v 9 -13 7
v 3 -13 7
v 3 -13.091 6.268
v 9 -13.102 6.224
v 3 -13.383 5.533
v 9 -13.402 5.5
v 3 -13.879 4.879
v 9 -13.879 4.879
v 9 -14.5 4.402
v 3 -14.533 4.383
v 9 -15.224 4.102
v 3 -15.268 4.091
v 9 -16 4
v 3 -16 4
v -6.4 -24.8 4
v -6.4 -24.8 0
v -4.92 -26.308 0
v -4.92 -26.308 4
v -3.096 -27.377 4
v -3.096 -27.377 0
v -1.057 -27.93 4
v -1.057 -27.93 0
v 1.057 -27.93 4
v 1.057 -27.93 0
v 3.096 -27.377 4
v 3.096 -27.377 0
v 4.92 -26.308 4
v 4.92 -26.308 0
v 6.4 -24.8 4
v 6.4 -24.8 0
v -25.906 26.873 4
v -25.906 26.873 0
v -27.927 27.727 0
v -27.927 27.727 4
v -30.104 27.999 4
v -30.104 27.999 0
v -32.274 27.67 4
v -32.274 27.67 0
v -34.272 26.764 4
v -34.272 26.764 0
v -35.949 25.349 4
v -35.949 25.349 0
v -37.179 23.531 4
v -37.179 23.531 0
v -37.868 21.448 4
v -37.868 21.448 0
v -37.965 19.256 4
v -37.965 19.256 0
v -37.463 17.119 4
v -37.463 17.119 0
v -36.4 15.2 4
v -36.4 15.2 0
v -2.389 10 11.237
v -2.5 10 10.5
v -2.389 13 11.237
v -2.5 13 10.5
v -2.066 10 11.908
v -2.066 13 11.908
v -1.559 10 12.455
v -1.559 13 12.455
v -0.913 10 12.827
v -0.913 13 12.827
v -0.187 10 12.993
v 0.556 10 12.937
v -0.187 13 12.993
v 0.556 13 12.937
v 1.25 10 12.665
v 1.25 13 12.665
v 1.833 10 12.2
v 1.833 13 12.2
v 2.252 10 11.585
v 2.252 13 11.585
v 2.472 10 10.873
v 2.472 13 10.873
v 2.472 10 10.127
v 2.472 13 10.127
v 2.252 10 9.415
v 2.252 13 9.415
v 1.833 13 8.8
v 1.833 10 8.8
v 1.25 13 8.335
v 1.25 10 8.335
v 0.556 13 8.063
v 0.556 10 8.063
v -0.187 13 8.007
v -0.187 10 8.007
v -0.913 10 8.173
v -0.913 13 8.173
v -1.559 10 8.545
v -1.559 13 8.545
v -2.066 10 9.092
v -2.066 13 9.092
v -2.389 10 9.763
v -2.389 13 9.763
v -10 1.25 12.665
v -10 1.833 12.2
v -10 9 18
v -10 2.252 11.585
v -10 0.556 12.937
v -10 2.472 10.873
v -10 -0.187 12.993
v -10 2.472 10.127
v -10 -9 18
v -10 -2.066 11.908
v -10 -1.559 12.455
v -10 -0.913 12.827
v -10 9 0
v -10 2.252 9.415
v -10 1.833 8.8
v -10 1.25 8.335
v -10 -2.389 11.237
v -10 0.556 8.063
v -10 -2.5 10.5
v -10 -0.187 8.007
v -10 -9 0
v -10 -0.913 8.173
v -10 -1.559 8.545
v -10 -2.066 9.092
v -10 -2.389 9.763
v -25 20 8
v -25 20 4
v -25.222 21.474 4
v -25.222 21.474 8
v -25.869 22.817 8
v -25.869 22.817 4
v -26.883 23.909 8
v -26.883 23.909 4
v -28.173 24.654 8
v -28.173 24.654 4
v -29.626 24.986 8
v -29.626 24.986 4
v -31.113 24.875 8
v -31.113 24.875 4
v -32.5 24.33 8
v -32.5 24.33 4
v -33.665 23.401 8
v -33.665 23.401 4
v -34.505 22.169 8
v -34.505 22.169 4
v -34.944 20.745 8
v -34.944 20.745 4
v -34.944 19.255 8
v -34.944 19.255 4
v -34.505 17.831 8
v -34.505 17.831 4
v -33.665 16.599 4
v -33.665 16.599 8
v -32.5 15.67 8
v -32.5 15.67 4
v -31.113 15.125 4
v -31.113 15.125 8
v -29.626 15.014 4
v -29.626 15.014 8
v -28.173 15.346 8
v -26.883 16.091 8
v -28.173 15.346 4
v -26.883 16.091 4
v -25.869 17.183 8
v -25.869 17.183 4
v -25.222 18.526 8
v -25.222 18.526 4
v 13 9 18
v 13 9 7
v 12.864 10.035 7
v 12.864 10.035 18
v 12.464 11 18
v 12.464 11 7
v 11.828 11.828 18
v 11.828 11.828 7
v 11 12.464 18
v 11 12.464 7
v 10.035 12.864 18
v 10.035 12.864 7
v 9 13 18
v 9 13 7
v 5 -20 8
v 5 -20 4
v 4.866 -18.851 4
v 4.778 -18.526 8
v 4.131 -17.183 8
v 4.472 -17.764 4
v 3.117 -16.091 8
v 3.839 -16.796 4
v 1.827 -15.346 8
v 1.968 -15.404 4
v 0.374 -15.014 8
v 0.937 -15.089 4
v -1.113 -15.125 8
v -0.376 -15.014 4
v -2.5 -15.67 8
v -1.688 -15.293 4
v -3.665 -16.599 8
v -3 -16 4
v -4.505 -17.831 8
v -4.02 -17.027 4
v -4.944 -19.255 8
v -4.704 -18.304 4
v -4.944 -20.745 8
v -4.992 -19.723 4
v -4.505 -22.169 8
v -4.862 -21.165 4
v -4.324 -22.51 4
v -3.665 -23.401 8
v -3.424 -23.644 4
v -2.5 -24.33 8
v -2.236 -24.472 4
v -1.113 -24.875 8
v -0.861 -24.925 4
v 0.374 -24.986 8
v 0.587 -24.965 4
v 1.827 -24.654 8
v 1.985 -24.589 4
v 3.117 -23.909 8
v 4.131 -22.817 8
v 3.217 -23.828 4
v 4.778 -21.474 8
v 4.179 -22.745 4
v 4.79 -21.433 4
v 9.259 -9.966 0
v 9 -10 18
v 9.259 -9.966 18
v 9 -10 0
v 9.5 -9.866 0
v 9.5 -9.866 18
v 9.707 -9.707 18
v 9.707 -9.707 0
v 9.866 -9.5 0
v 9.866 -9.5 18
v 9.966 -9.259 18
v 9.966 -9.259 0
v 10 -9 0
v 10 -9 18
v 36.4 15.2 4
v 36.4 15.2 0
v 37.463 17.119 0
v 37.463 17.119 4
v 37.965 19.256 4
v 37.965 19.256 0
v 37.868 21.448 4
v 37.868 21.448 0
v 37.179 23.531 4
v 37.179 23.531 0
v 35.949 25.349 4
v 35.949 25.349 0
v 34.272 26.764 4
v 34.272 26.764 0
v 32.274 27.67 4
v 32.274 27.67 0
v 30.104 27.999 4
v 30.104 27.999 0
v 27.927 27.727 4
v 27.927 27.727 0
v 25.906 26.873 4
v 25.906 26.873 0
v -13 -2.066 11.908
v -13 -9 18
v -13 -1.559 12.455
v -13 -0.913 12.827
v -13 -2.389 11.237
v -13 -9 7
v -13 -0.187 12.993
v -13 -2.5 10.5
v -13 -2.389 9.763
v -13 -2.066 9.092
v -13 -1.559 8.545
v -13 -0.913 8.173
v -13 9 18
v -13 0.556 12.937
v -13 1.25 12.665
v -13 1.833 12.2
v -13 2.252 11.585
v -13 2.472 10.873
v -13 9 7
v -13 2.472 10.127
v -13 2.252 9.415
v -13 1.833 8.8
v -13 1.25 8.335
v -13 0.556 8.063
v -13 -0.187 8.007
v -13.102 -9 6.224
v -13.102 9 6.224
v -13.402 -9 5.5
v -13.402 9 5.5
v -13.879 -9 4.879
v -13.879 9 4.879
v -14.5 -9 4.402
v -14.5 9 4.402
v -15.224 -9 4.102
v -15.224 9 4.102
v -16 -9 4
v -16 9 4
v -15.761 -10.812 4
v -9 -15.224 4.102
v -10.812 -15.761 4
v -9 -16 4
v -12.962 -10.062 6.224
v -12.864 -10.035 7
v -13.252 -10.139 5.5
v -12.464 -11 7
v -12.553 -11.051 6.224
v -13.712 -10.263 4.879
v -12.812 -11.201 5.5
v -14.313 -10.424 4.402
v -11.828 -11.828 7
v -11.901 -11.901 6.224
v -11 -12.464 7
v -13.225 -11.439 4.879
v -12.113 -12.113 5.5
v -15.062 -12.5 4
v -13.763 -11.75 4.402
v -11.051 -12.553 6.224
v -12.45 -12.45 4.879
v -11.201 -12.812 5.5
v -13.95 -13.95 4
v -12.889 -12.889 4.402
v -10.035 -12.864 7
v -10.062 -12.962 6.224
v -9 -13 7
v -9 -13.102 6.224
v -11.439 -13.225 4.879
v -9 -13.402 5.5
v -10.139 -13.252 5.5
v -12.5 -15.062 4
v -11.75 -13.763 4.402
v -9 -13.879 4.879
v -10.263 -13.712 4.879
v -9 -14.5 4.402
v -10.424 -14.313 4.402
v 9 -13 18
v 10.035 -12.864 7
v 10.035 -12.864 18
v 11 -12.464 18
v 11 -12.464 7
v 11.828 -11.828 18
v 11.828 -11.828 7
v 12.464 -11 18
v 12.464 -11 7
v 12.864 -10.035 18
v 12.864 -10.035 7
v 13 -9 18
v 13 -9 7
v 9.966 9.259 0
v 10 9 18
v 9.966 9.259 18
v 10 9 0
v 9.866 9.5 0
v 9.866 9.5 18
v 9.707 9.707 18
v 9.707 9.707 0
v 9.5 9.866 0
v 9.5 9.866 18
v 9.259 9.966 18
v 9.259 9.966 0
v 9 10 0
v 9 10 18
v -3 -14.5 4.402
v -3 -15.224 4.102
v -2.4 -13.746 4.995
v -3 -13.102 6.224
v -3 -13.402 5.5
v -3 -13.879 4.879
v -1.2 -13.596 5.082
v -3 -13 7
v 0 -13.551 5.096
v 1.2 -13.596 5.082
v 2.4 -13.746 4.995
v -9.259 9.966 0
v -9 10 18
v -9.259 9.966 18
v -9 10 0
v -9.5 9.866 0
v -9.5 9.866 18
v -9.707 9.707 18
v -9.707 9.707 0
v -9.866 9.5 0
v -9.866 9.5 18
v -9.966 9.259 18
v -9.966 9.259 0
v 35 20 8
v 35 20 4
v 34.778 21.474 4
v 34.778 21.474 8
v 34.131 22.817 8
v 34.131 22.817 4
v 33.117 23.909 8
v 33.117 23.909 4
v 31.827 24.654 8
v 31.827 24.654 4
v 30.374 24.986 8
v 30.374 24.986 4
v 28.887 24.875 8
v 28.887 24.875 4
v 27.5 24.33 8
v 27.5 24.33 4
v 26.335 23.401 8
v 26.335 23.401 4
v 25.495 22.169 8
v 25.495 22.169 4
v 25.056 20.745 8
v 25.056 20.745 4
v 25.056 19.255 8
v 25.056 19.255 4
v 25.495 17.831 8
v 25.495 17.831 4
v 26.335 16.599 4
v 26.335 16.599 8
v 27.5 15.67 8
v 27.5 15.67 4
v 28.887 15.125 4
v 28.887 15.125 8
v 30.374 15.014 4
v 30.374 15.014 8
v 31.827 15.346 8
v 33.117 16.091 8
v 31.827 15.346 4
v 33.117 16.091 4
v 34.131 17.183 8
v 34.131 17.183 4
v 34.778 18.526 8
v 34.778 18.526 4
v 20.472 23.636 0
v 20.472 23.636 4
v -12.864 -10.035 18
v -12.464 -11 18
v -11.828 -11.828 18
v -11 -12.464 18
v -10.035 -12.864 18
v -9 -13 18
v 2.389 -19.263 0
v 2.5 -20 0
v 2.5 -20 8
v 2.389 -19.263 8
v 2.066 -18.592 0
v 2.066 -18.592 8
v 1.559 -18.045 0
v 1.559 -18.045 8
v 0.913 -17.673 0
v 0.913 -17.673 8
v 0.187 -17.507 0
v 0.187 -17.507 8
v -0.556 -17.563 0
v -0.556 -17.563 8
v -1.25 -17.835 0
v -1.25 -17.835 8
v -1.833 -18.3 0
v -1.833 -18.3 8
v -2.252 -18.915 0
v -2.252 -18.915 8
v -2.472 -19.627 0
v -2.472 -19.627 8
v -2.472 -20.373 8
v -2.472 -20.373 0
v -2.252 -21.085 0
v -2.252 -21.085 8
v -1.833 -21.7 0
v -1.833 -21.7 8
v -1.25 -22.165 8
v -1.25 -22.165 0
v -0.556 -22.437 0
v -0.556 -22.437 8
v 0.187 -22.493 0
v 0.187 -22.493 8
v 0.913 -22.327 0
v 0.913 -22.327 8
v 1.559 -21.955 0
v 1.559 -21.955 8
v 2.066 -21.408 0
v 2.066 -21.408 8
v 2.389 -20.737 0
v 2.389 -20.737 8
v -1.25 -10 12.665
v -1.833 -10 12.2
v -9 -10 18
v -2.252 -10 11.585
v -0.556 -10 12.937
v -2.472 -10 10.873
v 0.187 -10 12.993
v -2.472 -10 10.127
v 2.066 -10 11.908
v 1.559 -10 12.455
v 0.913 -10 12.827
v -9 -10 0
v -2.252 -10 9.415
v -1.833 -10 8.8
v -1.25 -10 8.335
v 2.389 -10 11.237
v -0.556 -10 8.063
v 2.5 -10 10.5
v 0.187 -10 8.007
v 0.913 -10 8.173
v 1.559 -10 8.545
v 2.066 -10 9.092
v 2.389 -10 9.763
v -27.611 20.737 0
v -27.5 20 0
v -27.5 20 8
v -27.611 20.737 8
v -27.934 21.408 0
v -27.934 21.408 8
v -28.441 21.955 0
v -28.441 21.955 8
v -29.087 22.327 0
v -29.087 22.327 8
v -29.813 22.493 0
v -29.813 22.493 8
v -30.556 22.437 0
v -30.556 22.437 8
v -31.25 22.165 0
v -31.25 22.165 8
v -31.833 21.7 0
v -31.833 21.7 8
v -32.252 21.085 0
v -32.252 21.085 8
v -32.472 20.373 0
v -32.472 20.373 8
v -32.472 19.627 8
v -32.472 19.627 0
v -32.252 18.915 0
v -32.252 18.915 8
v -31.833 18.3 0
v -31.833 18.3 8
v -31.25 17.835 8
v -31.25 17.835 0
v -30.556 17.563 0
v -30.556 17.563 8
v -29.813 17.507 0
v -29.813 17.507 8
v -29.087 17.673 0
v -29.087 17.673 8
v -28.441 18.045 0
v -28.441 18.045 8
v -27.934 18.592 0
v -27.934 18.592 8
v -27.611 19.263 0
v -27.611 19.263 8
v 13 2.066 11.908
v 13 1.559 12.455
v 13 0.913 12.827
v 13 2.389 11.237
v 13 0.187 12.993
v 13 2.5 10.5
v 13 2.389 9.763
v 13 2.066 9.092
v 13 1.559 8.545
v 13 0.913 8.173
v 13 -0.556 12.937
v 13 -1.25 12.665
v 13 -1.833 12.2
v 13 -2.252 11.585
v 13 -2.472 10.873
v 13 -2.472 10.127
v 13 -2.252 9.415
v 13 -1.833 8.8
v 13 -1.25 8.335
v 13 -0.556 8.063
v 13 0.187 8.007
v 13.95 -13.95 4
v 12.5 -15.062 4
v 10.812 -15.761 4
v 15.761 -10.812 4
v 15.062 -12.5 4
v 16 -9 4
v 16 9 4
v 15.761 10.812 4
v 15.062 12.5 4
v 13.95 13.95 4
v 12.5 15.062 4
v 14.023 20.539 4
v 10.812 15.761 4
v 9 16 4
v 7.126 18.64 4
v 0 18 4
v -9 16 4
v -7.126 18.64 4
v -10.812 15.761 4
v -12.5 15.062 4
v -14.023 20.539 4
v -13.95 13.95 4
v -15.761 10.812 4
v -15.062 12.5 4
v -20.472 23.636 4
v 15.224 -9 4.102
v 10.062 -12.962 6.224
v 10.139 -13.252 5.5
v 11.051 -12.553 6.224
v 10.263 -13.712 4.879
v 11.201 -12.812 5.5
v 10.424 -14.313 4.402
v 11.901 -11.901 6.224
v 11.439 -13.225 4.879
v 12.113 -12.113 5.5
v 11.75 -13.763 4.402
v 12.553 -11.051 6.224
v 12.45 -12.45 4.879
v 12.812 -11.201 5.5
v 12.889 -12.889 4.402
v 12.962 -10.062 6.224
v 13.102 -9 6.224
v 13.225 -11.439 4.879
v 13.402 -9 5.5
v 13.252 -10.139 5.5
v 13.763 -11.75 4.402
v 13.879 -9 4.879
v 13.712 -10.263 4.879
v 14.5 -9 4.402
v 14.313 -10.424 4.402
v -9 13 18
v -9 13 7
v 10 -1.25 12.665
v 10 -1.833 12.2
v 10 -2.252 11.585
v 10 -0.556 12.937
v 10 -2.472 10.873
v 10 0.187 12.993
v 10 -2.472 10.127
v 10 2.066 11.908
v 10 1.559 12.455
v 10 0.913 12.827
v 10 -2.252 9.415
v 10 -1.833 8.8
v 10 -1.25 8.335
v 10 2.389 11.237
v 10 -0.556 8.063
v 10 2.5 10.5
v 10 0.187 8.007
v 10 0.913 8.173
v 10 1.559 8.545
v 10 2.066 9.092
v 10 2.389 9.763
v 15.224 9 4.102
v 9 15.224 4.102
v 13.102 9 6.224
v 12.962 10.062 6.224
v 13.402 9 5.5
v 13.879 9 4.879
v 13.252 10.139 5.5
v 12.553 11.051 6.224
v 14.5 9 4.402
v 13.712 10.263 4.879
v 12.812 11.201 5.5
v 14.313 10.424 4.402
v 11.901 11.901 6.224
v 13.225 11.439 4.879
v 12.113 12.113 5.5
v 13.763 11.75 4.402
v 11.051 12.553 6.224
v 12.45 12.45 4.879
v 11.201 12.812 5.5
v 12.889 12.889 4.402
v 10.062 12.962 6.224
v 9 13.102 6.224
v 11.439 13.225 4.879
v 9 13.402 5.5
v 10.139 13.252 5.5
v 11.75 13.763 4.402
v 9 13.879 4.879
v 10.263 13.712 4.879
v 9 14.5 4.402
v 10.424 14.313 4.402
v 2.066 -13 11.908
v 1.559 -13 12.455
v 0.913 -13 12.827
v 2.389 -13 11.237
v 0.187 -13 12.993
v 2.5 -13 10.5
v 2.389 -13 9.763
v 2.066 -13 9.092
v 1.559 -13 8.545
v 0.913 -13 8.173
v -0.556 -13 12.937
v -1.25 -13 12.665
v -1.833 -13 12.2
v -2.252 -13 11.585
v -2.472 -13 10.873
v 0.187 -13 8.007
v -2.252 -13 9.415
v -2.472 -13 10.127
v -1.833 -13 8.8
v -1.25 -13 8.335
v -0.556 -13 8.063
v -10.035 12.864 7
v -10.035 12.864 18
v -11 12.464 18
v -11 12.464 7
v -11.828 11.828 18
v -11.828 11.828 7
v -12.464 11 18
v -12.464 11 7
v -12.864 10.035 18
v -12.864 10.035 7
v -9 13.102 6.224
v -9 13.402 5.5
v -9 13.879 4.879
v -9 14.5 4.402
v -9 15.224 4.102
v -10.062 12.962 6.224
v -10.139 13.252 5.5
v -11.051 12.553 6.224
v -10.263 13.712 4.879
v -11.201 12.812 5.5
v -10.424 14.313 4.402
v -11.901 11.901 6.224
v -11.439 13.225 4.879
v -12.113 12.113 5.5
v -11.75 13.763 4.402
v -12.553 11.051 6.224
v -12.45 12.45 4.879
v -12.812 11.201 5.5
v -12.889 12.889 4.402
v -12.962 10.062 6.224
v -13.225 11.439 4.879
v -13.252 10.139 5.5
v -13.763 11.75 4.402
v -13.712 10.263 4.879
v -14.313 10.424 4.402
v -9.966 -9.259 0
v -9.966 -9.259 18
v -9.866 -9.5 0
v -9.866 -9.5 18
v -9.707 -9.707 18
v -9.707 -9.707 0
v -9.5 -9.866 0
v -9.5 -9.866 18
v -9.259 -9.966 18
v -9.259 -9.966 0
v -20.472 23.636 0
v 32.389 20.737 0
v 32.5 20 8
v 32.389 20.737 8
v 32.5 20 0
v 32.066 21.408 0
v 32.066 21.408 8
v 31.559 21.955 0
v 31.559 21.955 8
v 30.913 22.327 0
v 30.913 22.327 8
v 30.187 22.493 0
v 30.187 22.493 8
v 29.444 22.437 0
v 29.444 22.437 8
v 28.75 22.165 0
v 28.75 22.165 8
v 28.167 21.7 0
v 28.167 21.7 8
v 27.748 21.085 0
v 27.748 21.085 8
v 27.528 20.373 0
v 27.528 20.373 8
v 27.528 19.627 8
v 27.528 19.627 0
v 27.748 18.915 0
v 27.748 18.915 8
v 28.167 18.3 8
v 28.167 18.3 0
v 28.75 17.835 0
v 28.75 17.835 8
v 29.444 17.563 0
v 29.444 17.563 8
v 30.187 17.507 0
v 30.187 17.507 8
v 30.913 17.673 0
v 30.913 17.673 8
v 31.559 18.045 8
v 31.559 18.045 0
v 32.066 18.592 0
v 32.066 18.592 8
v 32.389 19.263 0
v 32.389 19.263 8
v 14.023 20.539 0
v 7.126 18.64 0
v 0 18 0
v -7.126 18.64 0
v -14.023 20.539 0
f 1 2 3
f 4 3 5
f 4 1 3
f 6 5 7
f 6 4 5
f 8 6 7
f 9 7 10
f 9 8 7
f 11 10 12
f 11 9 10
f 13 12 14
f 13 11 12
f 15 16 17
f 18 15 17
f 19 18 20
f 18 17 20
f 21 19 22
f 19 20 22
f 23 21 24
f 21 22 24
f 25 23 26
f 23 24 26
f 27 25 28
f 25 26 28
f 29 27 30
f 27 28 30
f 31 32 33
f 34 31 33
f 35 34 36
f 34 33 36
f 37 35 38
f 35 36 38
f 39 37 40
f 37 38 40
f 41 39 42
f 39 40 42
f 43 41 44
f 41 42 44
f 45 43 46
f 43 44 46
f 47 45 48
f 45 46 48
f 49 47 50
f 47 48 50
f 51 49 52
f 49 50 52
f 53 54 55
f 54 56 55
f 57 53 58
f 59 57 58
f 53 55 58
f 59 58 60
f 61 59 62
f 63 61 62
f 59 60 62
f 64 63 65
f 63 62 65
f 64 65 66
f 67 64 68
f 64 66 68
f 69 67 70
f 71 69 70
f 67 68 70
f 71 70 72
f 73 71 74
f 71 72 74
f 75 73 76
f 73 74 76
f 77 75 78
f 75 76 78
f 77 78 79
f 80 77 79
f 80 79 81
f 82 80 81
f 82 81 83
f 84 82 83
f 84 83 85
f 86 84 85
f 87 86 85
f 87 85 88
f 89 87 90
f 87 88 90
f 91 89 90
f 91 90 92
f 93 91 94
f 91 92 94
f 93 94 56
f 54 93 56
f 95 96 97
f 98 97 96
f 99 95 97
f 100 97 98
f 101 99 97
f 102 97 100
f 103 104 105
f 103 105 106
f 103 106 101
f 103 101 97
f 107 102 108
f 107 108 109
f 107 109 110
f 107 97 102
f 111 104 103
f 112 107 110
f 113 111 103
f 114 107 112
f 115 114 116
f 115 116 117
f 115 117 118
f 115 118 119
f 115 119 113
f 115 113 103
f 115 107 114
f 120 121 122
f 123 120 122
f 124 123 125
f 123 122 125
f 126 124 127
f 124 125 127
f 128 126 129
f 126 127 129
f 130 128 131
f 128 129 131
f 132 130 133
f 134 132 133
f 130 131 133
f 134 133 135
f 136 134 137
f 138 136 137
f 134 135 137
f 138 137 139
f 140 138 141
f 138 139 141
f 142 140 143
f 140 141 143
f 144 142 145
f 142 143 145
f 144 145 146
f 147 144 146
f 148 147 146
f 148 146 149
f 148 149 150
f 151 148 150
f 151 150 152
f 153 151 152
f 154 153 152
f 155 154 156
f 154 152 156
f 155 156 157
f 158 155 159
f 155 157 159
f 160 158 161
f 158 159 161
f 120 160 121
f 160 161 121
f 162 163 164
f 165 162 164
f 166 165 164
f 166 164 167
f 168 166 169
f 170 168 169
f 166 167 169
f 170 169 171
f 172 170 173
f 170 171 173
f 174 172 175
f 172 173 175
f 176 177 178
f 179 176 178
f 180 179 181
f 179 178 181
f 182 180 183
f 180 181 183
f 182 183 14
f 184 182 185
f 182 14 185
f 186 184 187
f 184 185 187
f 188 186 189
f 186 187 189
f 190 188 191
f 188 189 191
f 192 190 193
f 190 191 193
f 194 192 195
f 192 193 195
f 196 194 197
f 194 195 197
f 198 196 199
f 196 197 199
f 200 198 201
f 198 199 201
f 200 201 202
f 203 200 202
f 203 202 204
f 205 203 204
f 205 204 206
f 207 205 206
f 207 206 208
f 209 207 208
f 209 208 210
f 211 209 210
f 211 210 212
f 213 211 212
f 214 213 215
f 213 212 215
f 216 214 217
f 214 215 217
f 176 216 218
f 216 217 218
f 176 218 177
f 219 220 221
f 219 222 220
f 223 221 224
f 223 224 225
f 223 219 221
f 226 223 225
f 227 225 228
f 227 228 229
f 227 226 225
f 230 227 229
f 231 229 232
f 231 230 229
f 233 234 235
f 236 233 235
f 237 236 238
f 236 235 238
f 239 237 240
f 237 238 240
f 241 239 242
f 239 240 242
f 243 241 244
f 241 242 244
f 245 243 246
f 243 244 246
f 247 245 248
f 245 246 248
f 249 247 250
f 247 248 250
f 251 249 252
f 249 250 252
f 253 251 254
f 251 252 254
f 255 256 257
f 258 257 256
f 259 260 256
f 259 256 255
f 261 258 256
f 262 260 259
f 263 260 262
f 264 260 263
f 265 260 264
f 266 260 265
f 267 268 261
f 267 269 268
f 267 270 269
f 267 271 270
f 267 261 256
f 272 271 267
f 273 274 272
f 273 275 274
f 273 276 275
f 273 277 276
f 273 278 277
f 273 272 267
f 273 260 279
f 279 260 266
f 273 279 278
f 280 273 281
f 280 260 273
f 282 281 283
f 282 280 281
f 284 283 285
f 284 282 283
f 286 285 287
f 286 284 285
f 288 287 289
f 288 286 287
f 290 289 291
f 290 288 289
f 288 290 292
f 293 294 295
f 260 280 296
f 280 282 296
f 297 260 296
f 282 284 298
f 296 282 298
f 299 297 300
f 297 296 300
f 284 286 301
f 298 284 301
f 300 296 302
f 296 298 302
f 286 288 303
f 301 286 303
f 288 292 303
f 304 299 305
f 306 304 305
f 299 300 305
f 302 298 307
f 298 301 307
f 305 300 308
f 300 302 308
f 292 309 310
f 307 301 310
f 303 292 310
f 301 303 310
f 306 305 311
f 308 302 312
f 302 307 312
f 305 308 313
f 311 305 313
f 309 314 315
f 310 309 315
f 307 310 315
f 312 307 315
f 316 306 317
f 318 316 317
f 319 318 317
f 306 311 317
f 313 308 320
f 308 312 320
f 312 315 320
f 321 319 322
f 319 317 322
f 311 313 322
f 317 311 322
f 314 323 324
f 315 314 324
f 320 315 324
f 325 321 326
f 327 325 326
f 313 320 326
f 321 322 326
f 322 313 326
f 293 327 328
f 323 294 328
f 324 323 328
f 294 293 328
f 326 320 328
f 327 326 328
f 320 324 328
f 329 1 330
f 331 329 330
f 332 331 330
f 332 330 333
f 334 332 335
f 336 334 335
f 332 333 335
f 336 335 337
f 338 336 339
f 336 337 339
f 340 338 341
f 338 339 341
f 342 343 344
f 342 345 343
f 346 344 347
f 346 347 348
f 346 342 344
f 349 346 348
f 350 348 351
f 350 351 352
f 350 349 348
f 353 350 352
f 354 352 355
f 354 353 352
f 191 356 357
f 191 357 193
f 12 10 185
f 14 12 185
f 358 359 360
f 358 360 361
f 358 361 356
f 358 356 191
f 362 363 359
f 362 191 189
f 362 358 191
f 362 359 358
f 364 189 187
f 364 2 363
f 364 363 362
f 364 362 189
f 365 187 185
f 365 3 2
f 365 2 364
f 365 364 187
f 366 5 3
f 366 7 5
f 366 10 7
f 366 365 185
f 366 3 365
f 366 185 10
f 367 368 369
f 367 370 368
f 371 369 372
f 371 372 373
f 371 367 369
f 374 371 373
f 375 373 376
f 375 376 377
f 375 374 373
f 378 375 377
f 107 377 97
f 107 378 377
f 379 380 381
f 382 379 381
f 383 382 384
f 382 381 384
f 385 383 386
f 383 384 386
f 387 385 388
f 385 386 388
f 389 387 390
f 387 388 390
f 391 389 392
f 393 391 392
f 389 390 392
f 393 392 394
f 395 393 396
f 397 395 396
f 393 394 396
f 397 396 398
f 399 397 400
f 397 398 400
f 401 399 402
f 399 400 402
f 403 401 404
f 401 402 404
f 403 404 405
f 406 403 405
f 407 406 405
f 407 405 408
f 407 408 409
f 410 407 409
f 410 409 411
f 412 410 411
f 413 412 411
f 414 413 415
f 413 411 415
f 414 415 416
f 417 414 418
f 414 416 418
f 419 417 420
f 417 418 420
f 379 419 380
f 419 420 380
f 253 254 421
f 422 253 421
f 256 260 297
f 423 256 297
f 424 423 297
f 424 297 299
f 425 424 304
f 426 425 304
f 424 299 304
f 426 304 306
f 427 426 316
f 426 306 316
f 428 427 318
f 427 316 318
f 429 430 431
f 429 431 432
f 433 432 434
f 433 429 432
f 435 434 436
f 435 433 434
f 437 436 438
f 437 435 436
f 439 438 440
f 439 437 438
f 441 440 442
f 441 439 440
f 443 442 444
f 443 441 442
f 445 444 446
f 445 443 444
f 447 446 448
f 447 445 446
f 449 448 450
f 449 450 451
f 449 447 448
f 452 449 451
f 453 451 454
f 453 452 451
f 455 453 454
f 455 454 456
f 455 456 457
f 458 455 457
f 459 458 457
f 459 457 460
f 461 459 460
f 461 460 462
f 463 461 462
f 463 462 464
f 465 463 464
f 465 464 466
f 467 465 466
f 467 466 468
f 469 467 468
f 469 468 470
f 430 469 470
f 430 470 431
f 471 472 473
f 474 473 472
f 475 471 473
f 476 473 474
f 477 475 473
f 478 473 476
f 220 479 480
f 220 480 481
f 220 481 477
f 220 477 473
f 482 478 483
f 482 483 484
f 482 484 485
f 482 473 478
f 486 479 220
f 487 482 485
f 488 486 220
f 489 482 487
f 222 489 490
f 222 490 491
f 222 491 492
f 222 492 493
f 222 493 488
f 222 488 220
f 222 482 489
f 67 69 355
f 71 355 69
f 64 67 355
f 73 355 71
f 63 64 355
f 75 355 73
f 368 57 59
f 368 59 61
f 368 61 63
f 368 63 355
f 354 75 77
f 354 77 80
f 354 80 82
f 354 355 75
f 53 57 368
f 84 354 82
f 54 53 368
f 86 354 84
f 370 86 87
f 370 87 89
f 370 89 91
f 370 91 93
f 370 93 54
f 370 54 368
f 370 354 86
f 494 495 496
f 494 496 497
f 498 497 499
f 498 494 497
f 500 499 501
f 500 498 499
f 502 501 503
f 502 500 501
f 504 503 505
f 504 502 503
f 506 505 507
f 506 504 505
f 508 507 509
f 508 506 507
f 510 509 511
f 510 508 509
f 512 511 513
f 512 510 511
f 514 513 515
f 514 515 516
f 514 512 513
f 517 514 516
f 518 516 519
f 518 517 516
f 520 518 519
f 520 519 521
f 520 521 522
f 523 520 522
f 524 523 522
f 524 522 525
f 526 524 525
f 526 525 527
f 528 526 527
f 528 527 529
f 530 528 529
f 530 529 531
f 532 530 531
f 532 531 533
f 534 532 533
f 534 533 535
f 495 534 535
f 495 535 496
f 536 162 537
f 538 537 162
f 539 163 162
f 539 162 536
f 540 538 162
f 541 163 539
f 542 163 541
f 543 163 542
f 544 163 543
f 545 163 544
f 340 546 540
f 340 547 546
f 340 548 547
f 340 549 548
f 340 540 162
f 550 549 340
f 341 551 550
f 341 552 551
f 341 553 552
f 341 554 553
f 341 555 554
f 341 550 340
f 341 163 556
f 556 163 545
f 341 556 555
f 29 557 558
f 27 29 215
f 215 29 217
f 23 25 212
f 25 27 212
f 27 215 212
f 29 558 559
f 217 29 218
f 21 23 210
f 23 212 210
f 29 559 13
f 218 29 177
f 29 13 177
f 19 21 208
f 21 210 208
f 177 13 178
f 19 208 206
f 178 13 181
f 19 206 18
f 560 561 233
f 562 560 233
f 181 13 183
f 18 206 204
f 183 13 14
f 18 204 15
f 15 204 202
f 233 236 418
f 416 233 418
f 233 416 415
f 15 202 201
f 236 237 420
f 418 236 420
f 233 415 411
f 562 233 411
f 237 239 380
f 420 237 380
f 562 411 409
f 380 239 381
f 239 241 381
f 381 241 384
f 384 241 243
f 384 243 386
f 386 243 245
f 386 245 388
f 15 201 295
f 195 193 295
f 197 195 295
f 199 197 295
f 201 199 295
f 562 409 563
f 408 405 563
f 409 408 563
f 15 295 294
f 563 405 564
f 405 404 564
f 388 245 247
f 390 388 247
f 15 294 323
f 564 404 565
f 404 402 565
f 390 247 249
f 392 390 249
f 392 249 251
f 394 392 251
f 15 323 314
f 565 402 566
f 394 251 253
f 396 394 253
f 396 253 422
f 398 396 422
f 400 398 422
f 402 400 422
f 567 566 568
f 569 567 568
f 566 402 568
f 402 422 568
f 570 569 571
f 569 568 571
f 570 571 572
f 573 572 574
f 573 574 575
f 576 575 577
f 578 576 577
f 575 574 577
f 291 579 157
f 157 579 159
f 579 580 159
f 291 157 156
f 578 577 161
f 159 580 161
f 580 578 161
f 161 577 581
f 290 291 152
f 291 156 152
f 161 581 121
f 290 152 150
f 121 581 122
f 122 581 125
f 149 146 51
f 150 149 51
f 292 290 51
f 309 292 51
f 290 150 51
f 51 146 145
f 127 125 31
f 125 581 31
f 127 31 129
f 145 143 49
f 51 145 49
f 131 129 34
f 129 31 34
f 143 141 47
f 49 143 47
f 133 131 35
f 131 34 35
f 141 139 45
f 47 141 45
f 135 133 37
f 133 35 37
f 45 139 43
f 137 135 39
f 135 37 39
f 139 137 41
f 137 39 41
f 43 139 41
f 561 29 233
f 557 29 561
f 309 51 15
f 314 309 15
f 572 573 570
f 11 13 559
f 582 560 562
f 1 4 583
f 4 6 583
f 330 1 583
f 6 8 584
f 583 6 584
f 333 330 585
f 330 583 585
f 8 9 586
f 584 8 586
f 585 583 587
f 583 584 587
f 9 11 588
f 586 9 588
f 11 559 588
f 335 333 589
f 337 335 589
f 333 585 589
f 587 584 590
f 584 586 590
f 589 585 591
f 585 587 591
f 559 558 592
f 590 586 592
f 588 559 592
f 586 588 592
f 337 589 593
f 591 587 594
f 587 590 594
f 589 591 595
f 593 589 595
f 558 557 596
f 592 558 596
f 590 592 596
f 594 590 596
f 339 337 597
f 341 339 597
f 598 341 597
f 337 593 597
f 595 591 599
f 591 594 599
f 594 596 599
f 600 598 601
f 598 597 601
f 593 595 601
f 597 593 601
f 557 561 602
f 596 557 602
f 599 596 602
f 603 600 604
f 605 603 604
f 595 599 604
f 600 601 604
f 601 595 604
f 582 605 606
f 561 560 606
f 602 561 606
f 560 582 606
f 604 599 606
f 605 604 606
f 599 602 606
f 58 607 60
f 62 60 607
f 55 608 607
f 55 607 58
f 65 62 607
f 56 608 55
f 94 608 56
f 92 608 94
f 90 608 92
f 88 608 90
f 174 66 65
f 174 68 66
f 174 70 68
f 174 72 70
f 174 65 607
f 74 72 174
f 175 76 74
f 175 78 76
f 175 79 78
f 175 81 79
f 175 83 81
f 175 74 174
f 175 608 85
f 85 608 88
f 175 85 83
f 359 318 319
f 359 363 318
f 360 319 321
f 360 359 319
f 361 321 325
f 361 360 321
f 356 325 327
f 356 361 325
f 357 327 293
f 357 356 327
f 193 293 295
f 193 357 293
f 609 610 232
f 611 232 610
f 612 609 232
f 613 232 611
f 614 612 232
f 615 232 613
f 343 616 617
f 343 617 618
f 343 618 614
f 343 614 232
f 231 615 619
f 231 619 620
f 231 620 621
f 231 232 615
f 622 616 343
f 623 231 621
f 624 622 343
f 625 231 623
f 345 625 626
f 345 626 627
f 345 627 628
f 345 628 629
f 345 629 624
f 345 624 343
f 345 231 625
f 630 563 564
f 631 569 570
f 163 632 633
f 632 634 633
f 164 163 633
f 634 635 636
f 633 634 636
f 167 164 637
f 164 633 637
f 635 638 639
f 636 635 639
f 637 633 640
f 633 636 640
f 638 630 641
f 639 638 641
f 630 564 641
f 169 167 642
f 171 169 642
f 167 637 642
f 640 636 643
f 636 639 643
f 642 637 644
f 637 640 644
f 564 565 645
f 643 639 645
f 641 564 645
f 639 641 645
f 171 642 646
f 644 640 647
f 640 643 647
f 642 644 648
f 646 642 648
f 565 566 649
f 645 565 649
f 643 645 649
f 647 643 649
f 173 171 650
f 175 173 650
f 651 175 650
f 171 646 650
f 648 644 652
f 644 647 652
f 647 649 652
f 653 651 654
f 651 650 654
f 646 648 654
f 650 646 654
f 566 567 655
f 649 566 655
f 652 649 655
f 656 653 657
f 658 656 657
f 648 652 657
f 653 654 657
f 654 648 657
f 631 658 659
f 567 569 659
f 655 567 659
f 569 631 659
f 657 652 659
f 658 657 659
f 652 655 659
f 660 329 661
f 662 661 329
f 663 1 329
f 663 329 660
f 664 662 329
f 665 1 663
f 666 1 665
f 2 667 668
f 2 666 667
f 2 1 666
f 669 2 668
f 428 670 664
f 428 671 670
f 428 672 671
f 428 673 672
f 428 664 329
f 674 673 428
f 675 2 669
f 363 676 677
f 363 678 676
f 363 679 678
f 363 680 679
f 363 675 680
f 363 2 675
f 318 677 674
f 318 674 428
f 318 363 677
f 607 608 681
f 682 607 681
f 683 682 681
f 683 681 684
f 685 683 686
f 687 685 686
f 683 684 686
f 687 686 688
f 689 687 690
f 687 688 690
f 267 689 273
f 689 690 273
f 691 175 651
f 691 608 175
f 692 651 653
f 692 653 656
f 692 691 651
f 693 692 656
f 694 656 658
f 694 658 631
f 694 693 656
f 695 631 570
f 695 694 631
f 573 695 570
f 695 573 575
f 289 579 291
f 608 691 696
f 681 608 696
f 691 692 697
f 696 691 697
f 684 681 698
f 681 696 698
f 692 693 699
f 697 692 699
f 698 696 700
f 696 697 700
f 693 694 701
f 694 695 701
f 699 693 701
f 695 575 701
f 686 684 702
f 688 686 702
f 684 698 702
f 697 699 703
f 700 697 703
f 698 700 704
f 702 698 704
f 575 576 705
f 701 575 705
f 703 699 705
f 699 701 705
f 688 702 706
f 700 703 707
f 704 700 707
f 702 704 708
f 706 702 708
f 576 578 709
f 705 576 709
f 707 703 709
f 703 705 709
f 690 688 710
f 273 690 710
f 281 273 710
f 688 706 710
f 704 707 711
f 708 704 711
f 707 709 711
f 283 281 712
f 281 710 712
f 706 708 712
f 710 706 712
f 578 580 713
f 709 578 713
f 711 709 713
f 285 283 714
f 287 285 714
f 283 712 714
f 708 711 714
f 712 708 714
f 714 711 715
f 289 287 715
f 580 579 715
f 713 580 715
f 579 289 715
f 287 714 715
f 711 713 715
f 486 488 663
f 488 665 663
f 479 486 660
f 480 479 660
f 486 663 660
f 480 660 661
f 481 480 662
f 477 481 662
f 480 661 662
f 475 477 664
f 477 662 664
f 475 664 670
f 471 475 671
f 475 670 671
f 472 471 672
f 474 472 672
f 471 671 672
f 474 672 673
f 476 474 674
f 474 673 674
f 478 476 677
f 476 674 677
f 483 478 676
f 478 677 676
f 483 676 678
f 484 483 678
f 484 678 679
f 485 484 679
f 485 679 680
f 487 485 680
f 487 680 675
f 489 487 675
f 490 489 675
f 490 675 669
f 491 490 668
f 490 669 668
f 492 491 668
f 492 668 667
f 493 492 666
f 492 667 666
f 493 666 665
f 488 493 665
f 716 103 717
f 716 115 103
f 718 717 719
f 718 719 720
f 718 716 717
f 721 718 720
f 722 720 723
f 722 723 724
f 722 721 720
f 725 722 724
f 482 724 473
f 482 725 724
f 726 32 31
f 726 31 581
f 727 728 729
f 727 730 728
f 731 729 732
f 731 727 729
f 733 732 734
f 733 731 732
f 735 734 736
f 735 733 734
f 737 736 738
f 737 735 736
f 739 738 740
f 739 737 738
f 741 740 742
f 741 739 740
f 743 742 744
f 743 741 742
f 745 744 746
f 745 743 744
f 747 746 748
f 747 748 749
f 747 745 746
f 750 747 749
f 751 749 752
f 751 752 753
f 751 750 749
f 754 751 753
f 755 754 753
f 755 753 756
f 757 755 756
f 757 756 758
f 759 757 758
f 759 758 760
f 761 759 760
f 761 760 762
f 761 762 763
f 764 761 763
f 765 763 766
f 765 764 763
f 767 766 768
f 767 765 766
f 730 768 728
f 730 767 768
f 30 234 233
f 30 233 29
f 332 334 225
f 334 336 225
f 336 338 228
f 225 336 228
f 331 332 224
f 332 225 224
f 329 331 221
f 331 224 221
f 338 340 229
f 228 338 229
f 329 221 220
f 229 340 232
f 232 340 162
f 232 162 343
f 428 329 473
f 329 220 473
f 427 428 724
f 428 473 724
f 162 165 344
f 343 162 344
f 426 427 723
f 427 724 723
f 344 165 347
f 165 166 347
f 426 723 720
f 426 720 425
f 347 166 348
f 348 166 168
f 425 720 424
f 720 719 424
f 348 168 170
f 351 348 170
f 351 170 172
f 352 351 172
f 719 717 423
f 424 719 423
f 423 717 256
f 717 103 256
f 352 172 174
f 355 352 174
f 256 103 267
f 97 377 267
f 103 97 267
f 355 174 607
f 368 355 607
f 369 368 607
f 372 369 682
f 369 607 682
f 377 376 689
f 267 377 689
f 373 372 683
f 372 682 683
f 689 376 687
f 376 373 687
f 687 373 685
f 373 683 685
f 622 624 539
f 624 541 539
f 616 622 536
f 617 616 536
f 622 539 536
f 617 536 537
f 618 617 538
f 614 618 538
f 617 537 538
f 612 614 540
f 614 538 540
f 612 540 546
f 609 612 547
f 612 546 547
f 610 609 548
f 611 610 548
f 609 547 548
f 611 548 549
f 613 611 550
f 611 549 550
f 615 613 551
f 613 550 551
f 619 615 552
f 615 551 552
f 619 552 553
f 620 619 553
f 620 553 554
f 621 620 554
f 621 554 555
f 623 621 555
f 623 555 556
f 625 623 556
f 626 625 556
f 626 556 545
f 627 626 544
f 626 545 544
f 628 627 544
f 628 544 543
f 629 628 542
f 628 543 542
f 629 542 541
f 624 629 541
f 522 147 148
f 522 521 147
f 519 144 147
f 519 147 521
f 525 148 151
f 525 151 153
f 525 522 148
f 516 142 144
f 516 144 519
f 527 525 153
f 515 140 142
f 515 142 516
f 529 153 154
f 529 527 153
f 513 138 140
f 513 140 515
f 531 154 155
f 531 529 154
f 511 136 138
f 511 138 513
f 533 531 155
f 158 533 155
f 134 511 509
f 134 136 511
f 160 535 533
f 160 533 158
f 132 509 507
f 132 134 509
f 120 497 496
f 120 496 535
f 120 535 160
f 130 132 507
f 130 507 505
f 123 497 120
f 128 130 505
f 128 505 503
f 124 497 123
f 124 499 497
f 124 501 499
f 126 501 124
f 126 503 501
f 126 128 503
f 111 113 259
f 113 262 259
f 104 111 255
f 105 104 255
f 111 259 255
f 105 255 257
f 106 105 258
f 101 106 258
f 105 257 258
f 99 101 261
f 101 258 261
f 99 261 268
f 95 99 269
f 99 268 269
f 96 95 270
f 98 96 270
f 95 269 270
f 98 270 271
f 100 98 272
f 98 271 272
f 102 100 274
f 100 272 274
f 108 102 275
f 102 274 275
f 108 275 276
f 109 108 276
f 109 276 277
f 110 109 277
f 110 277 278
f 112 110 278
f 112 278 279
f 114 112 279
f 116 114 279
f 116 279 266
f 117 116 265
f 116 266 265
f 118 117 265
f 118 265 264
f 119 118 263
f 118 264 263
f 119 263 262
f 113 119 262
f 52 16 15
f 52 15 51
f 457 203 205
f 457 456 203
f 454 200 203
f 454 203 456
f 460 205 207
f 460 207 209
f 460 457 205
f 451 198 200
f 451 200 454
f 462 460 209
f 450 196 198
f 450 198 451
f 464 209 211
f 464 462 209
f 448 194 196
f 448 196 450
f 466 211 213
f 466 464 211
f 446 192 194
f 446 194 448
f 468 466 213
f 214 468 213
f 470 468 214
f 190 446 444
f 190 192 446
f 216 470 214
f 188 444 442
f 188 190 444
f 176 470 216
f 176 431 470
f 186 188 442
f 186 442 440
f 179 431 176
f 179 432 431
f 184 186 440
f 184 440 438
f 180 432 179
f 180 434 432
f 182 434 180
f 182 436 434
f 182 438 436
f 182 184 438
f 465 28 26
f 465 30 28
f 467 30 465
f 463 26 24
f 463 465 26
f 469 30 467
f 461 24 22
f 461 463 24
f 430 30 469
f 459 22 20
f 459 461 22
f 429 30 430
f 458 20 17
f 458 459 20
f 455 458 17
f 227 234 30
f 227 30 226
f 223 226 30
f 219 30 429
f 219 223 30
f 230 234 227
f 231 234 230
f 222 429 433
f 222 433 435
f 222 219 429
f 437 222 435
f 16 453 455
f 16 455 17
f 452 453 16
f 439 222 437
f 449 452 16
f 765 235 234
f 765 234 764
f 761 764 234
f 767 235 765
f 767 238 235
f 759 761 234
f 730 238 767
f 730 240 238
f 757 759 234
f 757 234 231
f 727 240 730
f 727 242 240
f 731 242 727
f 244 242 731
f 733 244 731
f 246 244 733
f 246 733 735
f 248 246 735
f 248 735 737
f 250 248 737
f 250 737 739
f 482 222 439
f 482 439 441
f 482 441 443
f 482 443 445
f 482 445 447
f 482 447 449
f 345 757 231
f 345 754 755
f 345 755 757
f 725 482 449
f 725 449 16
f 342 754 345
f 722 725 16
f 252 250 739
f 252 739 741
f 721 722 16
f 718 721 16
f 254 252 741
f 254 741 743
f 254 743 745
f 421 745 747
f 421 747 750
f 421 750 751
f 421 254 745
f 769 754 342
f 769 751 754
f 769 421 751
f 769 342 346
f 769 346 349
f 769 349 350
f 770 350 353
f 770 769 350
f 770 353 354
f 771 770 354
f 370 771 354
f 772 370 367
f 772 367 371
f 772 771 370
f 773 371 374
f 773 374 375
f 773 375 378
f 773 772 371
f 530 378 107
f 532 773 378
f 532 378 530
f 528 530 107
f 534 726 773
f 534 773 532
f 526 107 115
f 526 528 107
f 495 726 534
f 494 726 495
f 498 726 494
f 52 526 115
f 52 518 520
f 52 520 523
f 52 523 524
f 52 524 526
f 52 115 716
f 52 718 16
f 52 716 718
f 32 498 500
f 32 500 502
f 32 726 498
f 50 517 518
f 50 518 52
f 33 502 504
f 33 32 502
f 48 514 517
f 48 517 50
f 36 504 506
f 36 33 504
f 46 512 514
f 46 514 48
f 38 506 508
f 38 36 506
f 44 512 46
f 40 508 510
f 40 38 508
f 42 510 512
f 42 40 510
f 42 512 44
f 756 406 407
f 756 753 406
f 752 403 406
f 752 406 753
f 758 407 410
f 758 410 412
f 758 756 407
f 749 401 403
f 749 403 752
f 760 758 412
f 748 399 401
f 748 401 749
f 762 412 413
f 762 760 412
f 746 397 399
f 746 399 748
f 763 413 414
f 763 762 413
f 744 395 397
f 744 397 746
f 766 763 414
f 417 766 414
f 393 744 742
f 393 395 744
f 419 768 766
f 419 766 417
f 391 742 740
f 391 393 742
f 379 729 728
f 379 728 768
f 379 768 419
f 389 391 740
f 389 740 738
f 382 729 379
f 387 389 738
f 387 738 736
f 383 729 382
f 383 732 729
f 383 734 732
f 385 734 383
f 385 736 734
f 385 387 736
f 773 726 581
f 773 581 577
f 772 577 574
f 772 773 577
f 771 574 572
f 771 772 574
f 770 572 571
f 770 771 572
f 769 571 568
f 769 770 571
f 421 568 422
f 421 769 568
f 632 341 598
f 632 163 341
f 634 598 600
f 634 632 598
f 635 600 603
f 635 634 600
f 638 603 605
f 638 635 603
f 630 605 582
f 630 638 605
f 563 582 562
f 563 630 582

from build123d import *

# Parameters (mm, degrees)
SKETCH086_R           = 2.5
PAD028_DEPTH          = 4
PAD029_DEPTH          = 14
SKETCH088_R           = 2.5
POCKET028_DEPTH       = 4.5
POLARPATTERN014_COUNT = 4
SKETCH089_R           = 5
SKETCH089_R_2         = 2.5
PAD030_DEPTH          = 4
FILLET_R              = 3


with BuildPart() as part:
    # Sketch086 → Pad028 (new body)
    with BuildSketch(Plane.XY):
        with BuildLine():
            Line((36.4, 15.2), (6.4, -24.8))
            ThreePointArc((-6.4, -24.8), (0, -28), (6.4, -24.8))
            Line((-6.4, -24.8), (-36.4, 15.2))
            ThreePointArc((-25.905574, 26.872821), (-35.949169, 25.348588), (-36.4, 15.2))
            Line((-25.905574, 26.872821), (-20.472131, 23.635893))
            ThreePointArc((-20.472131, 23.635893), (0, 18), (20.472131, 23.635893))
            Line((25.905574, 26.872821), (20.472131, 23.635893))
            ThreePointArc((36.4, 15.2), (35.949169, 25.348588), (25.905574, 26.872821))
        make_face()
        with Locations((30, 20)):
            Circle(SKETCH086_R, mode=Mode.SUBTRACT)
        with Locations((-30, 20)):
            Circle(SKETCH086_R, mode=Mode.SUBTRACT)
        with Locations((0, -20)):
            Circle(SKETCH086_R, mode=Mode.SUBTRACT)
        with BuildLine():
            Line((-9, -10), (9, -10))
            ThreePointArc((9, -10), (9.707107, -9.707107), (10, -9))
            Line((10, -9), (10, 9))
            ThreePointArc((10, 9), (9.707107, 9.707107), (9, 10))
            Line((9, 10), (-9, 10))
            ThreePointArc((-9, 10), (-9.707107, 9.707107), (-10, 9))
            Line((-10, 9), (-10, -9))
            ThreePointArc((-10, -9), (-9.707107, -9.707107), (-9, -10))
        make_face(mode=Mode.SUBTRACT)
    extrude(amount=PAD028_DEPTH)

    # Sketch087 (on Face21 of Pad028) → Pad029 (join)
    with BuildSketch(Plane.XY.offset(4)):
        with BuildLine():
            Line((-9, 13), (9, 13))
            ThreePointArc((13, 9), (11.828427, 11.828427), (9, 13))
            Line((13, 9), (13, -9))
            ThreePointArc((9, -13), (11.828427, -11.828427), (13, -9))
            Line((9, -13), (-9, -13))
            ThreePointArc((-13, -9), (-11.828427, -11.828427), (-9, -13))
            Line((-13, -9), (-13, 9))
            ThreePointArc((-9, 13), (-11.828427, 11.828427), (-13, 9))
        make_face()
        with BuildLine():
            Line((-9, -10), (9, -10))
            ThreePointArc((9, -10), (9.707107, -9.707107), (10, -9))
            Line((10, -9), (10, 9))
            ThreePointArc((10, 9), (9.707107, 9.707107), (9, 10))
            Line((9, 10), (-9, 10))
            ThreePointArc((-9, 10), (-9.707107, 9.707107), (-10, 9))
            Line((-10, 9), (-10, -9))
            ThreePointArc((-10, -9), (-9.707107, -9.707107), (-9, -10))
        make_face(mode=Mode.SUBTRACT)
    extrude(amount=PAD029_DEPTH)

    # Sketch088 → Pocket028 (cut, symmetric)
    with BuildSketch(Plane(origin=(0, 13, 0), x_dir=(-1, 0, 0), z_dir=(0, 1, 0))):
        with Locations((0, 10.5)):
            Circle(SKETCH088_R)
    pocket028 = extrude(amount=POCKET028_DEPTH, both=True, mode=Mode.SUBTRACT)

    # PolarPattern014: Pocket028 ×4 about axis
    polarpattern014_axis = Axis((0, 0, 0), (0, 0, 1))
    for i in range(1, POLARPATTERN014_COUNT):
        add(pocket028.rotate(polarpattern014_axis, i * 360 / POLARPATTERN014_COUNT), mode=Mode.SUBTRACT)

    # Sketch089 (on Face1 of PolarPattern014) → Pad030 (join)
    with BuildSketch(Plane.XY.offset(4)):
        with Locations((30, 20)):
            Circle(SKETCH089_R)
        with Locations((30, 20)):
            Circle(SKETCH089_R_2, mode=Mode.SUBTRACT)
        with Locations((-30, 20)):
            Circle(SKETCH089_R)
        with Locations((-30, 20)):
            Circle(SKETCH089_R_2, mode=Mode.SUBTRACT)
        with Locations((0, -20)):
            Circle(SKETCH089_R)
        with Locations((0, -20)):
            Circle(SKETCH089_R_2, mode=Mode.SUBTRACT)
    extrude(amount=PAD030_DEPTH)

    # Fillet
    fillet_edges = [part.edges().sort_by_distance(p)[0] for p in [
        (-11.828427, 11.828427, 4),
    ]]
    fillet(fillet_edges, radius=FILLET_R)


solid = part.part
